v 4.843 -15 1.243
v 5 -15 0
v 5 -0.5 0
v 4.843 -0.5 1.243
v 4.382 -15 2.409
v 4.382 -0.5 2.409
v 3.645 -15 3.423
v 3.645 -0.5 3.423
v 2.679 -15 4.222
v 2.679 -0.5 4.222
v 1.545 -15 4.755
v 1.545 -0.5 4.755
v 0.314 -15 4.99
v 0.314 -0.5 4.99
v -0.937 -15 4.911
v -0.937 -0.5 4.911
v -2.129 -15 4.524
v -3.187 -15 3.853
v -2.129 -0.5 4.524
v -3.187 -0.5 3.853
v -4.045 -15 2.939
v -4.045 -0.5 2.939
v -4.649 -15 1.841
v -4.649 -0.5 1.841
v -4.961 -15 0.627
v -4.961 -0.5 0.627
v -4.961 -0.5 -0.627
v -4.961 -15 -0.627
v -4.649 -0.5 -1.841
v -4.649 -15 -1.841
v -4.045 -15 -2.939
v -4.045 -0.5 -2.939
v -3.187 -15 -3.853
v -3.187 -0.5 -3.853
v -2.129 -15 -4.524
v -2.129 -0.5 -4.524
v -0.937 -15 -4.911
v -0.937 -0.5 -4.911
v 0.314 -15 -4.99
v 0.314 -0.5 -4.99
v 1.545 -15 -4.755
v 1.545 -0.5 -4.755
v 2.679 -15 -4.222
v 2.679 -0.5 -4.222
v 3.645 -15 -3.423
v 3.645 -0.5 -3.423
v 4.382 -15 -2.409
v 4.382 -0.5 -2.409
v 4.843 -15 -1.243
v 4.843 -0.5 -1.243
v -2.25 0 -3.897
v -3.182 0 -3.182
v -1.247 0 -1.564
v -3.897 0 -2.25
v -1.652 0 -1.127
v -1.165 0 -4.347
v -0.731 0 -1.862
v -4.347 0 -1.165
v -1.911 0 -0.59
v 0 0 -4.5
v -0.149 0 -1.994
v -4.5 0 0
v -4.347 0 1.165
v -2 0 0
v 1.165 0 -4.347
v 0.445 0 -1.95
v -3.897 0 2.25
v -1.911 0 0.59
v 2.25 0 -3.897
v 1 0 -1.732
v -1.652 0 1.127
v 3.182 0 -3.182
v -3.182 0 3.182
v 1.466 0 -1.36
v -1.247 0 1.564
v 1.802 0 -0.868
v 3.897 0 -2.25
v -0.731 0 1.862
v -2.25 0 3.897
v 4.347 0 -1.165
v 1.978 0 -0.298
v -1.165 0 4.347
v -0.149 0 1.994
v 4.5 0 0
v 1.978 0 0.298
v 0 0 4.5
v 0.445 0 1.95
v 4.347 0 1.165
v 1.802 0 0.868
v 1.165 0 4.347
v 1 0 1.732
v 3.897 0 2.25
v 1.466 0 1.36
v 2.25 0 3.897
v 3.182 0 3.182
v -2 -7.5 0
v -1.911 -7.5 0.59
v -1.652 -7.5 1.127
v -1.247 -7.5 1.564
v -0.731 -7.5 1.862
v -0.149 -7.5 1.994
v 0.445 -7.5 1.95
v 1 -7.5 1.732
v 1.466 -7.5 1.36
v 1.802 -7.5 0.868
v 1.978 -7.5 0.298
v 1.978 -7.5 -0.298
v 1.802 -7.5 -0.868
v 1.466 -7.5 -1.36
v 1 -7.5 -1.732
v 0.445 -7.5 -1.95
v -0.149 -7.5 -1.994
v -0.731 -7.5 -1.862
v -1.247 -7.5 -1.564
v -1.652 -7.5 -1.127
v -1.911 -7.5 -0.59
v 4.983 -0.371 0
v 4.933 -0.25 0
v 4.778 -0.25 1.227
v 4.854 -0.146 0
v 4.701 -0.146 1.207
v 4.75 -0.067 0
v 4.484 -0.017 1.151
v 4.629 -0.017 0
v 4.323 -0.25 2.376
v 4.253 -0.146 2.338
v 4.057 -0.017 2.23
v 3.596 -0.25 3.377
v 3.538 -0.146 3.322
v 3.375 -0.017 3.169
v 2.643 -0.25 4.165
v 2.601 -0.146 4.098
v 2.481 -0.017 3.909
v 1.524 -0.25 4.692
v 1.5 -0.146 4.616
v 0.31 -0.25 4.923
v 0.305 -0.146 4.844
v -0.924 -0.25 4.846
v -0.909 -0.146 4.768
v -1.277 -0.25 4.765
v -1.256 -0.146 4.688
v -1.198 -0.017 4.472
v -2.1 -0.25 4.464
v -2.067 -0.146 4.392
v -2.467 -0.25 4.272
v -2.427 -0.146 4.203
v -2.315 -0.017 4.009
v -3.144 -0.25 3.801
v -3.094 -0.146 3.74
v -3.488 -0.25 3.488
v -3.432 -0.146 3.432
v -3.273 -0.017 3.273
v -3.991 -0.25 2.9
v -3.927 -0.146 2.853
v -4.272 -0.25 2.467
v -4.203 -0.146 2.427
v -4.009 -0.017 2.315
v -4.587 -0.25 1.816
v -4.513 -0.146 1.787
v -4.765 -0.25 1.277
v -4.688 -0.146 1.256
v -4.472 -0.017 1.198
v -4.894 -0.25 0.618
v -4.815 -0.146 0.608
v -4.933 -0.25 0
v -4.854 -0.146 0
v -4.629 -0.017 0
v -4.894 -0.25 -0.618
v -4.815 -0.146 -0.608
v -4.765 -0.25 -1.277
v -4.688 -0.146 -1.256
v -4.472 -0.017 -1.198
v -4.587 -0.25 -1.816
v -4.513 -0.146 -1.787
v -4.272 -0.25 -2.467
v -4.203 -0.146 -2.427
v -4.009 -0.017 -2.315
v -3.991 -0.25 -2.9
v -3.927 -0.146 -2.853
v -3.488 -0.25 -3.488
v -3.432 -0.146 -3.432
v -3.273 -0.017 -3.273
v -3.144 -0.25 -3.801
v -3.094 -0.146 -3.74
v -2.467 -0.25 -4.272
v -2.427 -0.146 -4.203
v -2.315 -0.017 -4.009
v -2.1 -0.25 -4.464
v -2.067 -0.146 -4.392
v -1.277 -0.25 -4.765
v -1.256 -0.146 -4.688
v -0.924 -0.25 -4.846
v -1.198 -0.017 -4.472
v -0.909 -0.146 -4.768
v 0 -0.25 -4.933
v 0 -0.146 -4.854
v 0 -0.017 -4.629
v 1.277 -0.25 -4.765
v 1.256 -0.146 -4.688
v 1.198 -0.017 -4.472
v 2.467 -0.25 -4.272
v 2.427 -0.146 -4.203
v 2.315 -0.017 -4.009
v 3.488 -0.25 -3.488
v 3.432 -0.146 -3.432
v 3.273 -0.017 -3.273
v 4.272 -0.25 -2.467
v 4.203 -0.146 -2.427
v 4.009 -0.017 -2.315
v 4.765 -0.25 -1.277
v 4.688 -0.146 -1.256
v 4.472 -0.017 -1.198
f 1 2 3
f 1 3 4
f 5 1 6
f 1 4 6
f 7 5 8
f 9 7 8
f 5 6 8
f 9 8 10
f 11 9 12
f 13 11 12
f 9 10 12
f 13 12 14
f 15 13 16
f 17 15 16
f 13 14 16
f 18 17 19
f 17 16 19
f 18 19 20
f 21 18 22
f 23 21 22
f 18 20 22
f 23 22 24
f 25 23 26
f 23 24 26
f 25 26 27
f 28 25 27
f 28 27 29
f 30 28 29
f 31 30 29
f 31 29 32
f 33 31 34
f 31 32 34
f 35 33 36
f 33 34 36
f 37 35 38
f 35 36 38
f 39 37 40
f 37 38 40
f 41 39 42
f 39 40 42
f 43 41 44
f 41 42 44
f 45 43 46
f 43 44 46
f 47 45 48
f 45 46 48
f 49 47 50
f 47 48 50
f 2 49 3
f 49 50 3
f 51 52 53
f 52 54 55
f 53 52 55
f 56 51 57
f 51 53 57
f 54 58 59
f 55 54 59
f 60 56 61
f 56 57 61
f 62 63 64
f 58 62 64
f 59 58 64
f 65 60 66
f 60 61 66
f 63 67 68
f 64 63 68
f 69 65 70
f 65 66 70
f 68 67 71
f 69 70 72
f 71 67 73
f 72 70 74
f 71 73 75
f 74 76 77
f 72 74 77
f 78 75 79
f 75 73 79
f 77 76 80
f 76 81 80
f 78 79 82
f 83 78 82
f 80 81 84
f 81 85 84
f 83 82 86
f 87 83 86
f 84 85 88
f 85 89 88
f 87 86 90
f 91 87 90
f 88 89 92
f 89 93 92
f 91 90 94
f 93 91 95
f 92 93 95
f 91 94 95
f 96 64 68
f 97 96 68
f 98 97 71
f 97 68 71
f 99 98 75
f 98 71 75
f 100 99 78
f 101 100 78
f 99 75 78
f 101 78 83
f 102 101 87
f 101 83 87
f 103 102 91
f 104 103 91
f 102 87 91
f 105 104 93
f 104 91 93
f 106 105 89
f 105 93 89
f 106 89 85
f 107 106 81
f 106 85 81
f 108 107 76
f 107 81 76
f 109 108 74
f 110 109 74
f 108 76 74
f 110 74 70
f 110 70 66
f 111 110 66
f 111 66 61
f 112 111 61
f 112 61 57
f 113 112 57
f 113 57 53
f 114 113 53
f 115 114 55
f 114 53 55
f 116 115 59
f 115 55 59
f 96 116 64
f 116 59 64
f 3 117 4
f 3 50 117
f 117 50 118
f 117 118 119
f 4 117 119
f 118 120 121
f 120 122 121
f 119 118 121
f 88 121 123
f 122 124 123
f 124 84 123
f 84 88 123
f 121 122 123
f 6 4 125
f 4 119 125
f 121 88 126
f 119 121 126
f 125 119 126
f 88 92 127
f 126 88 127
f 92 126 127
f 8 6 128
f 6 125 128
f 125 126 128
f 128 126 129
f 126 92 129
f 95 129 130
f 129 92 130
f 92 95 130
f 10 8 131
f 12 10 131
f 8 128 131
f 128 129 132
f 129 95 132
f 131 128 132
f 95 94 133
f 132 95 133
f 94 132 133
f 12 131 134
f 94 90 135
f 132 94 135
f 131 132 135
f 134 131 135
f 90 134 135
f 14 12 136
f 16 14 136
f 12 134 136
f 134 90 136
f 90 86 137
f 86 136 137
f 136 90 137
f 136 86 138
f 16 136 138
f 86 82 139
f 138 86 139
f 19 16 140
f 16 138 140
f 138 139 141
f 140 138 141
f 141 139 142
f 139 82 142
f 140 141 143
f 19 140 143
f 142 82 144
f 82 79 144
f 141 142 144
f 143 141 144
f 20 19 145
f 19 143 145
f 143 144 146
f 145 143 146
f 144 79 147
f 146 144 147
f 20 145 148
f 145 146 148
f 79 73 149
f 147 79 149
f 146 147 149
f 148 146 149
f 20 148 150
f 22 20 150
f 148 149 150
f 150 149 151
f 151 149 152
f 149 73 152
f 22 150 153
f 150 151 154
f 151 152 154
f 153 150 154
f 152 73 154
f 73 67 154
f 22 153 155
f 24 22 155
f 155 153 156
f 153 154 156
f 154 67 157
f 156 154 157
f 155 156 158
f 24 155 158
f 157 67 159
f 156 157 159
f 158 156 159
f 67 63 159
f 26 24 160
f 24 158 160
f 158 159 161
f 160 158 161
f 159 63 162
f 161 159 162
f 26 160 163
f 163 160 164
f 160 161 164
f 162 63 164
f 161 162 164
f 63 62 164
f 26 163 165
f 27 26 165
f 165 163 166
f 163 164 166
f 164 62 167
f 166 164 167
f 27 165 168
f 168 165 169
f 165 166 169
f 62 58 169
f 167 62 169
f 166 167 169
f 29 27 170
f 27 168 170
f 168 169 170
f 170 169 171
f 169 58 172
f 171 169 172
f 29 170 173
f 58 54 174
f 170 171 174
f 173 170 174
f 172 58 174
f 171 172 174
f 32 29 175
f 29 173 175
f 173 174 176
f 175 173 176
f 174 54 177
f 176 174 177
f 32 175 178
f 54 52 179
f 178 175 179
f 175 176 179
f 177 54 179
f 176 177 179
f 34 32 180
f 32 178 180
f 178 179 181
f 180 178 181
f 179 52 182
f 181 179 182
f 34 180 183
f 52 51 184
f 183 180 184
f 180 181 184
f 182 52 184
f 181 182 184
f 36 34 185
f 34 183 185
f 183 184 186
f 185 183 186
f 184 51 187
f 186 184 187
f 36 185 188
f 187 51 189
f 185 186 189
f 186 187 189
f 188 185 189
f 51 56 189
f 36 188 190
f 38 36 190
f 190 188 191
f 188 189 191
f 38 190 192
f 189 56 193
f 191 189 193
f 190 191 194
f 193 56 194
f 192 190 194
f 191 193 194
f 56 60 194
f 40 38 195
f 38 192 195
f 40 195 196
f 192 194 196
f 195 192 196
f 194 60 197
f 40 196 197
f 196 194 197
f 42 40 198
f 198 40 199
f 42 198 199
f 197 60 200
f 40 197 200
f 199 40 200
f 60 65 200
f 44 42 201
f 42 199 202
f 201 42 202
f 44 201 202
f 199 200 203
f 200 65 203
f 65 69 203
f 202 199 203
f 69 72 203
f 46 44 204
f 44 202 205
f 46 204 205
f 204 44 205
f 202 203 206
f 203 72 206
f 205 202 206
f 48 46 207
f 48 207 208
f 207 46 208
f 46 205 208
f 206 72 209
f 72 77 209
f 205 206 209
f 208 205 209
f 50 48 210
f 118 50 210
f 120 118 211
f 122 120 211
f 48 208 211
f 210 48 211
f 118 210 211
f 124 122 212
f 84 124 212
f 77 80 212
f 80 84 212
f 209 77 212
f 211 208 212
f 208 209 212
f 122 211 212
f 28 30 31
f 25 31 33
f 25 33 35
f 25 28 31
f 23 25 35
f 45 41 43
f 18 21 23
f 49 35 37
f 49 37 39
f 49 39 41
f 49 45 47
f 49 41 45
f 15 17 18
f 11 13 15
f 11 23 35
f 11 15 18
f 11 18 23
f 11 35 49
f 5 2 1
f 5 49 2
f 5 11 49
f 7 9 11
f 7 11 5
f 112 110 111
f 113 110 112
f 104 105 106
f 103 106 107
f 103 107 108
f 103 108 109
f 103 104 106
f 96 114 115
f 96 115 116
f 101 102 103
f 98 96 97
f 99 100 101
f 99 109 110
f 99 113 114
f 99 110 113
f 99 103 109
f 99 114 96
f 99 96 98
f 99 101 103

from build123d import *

# Parameters (mm, degrees)
F0_R     = 5
F1_DEPTH = 15
F2_R     = 0.5
F3_R     = 2
F4_DEPTH = 7.5


with BuildPart() as f1:
    # F0 (on Front) → F1 (new body)
    with BuildSketch(Plane.XZ):
        Circle(F0_R)
    extrude(amount=F1_DEPTH)

    # F2
    f2_edges = [f1.edges().sort_by_distance(p)[0] for p in [
        (-5, 0, 0),
    ]]
    fillet(f2_edges, radius=F2_R)

    # F3 (on face) → F4 (cut)
    with BuildSketch(Plane(origin=(0, 0, 0), x_dir=(-1, 0, 0), z_dir=(0, 1, 0))):
        Circle(F3_R)
    extrude(amount=-F4_DEPTH, mode=Mode.SUBTRACT)


solid = f1.part
